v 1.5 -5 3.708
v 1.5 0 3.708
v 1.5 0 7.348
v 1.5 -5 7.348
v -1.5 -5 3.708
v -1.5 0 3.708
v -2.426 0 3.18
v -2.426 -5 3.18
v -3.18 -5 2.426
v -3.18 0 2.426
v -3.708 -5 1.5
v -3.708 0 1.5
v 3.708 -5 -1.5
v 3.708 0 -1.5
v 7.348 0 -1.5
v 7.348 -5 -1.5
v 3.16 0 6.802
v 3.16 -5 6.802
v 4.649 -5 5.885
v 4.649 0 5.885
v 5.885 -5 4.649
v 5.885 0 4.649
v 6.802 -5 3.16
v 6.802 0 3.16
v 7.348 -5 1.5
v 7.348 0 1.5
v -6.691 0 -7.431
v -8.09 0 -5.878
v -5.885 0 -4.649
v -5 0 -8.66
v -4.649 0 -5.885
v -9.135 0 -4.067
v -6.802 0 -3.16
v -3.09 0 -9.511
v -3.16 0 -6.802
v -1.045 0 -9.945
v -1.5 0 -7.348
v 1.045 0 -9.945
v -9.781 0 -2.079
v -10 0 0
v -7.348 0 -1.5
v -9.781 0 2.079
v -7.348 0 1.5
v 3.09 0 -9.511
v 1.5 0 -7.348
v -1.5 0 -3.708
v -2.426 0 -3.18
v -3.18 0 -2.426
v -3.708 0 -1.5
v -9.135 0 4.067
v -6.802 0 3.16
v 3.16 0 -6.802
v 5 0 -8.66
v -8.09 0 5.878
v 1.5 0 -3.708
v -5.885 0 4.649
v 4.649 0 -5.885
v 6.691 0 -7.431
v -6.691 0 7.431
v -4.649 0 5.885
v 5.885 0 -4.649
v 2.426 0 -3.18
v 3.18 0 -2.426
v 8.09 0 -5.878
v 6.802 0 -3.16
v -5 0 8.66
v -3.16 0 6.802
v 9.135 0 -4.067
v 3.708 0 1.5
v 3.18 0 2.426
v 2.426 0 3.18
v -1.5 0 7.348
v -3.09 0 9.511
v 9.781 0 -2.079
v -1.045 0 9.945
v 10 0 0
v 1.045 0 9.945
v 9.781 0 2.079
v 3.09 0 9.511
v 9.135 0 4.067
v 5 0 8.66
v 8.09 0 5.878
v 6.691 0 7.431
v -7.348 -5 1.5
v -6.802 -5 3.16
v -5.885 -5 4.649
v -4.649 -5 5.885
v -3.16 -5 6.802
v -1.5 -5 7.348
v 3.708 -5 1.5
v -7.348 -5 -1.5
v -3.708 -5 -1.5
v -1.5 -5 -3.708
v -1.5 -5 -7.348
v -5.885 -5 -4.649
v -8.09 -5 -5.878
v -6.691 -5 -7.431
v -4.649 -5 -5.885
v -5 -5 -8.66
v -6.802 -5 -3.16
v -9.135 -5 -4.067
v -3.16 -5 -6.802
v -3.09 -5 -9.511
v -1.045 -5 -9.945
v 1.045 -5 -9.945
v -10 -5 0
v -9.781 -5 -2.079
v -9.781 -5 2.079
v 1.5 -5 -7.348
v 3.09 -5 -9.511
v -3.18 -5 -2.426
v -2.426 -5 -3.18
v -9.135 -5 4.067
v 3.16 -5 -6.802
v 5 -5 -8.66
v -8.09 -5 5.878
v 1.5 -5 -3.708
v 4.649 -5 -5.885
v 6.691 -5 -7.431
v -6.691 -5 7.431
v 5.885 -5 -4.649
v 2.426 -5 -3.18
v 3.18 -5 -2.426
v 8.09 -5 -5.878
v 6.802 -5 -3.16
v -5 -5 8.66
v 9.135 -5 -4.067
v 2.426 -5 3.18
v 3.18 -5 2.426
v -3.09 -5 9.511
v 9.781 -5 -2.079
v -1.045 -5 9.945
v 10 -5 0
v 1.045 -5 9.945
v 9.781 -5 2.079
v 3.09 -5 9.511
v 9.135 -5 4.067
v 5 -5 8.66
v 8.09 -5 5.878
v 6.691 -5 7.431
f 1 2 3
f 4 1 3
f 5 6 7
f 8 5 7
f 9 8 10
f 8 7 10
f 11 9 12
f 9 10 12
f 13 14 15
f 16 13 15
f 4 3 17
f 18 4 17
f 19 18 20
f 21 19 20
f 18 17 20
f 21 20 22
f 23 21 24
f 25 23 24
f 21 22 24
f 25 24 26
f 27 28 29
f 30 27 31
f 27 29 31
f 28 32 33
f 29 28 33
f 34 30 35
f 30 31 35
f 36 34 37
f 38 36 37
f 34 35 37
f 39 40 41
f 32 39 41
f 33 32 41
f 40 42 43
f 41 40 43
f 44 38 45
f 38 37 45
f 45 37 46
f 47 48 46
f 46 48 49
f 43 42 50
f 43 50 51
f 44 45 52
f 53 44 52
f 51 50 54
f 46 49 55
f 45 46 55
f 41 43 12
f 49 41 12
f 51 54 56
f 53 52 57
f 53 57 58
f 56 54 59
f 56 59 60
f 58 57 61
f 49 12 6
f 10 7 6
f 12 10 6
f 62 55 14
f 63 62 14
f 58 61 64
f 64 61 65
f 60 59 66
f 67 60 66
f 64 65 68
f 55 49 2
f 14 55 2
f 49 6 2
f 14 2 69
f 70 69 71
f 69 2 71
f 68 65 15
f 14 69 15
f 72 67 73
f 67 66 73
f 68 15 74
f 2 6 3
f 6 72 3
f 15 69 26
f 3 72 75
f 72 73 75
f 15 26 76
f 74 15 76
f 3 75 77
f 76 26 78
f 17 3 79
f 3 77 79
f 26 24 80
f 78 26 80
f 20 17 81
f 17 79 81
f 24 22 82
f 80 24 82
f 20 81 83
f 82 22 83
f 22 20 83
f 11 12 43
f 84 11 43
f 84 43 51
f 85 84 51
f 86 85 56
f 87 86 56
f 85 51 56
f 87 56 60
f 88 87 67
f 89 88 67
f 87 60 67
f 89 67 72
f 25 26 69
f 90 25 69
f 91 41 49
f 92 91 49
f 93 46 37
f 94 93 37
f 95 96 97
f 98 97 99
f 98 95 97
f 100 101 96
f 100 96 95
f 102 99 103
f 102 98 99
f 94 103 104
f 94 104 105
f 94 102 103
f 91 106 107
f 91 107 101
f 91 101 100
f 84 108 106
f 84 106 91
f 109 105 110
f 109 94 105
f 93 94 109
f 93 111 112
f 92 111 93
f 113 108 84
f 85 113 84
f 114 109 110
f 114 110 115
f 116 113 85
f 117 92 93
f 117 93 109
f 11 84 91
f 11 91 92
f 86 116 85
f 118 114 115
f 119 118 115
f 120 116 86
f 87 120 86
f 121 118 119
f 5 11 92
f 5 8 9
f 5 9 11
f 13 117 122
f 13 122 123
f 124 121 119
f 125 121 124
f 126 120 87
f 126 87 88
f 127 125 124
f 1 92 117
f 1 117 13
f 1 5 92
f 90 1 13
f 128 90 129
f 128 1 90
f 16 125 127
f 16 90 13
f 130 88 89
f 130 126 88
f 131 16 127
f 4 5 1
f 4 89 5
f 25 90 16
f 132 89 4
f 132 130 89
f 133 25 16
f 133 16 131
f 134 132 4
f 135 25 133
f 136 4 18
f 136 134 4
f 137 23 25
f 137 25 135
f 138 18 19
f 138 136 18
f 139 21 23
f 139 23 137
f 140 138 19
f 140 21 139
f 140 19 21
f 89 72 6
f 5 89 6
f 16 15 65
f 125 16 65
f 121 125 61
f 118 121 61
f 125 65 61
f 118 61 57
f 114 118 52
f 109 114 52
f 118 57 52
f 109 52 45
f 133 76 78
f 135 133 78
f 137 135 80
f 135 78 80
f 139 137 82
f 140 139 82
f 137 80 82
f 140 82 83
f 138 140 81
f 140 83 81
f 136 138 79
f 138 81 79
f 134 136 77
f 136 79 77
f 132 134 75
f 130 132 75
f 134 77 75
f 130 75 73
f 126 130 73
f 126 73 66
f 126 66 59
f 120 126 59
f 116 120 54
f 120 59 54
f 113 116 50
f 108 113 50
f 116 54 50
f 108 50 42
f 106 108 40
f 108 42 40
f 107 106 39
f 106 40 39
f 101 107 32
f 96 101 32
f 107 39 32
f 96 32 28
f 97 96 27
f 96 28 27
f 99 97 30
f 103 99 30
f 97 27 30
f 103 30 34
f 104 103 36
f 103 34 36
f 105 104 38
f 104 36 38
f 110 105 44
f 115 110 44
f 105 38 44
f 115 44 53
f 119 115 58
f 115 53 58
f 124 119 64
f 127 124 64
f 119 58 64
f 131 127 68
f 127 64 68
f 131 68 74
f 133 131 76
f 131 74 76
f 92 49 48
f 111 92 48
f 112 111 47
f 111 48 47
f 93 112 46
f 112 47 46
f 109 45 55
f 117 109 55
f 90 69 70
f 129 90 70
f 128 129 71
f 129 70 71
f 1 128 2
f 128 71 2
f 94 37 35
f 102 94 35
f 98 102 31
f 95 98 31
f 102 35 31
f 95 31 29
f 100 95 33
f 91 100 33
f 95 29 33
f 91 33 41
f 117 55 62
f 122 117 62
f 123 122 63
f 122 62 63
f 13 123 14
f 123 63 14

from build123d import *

# Parameters (mm, degrees)
F0_R     = 10
F1_DEPTH = 5


with BuildPart() as f1:
    # F0 (on Front) → F1 (new body)
    with BuildSketch(Plane.XZ):
        Circle(F0_R)
        with BuildLine():
            ThreePointArc((-3.708099, -1.5), (-2.828427, -2.828427), (-1.5, -3.708099))
            Line((-1.5, -3.708099), (-1.5, -7.348469))
            ThreePointArc((-1.5, -7.348469), (-5.303301, -5.303301), (-7.348469, -1.5))
            Line((-7.348469, -1.5), (-3.708099, -1.5))
        make_face(mode=Mode.SUBTRACT)
        with BuildLine():
            Line((3.708099, -1.5), (7.348469, -1.5))
            ThreePointArc((7.348469, -1.5), (5.303301, -5.303301), (1.5, -7.348469))
            Line((1.5, -7.348469), (1.5, -3.708099))
            ThreePointArc((1.5, -3.708099), (2.828427, -2.828427), (3.708099, -1.5))
        make_face(mode=Mode.SUBTRACT)
        with BuildLine():
            Line((-1.5, 7.348469), (-1.5, 3.708099))
            ThreePointArc((-1.5, 3.708099), (-2.828427, 2.828427), (-3.708099, 1.5))
            Line((-3.708099, 1.5), (-7.348469, 1.5))
            ThreePointArc((-7.348469, 1.5), (-5.303301, 5.303301), (-1.5, 7.348469))
        make_face(mode=Mode.SUBTRACT)
        with BuildLine():
            Line((1.5, 3.708099), (1.5, 7.348469))
            ThreePointArc((1.5, 7.348469), (5.303301, 5.303301), (7.348469, 1.5))
            Line((7.348469, 1.5), (3.708099, 1.5))
            ThreePointArc((3.708099, 1.5), (2.828427, 2.828427), (1.5, 3.708099))
        make_face(mode=Mode.SUBTRACT)
    extrude(amount=F1_DEPTH)


solid = f1.part
